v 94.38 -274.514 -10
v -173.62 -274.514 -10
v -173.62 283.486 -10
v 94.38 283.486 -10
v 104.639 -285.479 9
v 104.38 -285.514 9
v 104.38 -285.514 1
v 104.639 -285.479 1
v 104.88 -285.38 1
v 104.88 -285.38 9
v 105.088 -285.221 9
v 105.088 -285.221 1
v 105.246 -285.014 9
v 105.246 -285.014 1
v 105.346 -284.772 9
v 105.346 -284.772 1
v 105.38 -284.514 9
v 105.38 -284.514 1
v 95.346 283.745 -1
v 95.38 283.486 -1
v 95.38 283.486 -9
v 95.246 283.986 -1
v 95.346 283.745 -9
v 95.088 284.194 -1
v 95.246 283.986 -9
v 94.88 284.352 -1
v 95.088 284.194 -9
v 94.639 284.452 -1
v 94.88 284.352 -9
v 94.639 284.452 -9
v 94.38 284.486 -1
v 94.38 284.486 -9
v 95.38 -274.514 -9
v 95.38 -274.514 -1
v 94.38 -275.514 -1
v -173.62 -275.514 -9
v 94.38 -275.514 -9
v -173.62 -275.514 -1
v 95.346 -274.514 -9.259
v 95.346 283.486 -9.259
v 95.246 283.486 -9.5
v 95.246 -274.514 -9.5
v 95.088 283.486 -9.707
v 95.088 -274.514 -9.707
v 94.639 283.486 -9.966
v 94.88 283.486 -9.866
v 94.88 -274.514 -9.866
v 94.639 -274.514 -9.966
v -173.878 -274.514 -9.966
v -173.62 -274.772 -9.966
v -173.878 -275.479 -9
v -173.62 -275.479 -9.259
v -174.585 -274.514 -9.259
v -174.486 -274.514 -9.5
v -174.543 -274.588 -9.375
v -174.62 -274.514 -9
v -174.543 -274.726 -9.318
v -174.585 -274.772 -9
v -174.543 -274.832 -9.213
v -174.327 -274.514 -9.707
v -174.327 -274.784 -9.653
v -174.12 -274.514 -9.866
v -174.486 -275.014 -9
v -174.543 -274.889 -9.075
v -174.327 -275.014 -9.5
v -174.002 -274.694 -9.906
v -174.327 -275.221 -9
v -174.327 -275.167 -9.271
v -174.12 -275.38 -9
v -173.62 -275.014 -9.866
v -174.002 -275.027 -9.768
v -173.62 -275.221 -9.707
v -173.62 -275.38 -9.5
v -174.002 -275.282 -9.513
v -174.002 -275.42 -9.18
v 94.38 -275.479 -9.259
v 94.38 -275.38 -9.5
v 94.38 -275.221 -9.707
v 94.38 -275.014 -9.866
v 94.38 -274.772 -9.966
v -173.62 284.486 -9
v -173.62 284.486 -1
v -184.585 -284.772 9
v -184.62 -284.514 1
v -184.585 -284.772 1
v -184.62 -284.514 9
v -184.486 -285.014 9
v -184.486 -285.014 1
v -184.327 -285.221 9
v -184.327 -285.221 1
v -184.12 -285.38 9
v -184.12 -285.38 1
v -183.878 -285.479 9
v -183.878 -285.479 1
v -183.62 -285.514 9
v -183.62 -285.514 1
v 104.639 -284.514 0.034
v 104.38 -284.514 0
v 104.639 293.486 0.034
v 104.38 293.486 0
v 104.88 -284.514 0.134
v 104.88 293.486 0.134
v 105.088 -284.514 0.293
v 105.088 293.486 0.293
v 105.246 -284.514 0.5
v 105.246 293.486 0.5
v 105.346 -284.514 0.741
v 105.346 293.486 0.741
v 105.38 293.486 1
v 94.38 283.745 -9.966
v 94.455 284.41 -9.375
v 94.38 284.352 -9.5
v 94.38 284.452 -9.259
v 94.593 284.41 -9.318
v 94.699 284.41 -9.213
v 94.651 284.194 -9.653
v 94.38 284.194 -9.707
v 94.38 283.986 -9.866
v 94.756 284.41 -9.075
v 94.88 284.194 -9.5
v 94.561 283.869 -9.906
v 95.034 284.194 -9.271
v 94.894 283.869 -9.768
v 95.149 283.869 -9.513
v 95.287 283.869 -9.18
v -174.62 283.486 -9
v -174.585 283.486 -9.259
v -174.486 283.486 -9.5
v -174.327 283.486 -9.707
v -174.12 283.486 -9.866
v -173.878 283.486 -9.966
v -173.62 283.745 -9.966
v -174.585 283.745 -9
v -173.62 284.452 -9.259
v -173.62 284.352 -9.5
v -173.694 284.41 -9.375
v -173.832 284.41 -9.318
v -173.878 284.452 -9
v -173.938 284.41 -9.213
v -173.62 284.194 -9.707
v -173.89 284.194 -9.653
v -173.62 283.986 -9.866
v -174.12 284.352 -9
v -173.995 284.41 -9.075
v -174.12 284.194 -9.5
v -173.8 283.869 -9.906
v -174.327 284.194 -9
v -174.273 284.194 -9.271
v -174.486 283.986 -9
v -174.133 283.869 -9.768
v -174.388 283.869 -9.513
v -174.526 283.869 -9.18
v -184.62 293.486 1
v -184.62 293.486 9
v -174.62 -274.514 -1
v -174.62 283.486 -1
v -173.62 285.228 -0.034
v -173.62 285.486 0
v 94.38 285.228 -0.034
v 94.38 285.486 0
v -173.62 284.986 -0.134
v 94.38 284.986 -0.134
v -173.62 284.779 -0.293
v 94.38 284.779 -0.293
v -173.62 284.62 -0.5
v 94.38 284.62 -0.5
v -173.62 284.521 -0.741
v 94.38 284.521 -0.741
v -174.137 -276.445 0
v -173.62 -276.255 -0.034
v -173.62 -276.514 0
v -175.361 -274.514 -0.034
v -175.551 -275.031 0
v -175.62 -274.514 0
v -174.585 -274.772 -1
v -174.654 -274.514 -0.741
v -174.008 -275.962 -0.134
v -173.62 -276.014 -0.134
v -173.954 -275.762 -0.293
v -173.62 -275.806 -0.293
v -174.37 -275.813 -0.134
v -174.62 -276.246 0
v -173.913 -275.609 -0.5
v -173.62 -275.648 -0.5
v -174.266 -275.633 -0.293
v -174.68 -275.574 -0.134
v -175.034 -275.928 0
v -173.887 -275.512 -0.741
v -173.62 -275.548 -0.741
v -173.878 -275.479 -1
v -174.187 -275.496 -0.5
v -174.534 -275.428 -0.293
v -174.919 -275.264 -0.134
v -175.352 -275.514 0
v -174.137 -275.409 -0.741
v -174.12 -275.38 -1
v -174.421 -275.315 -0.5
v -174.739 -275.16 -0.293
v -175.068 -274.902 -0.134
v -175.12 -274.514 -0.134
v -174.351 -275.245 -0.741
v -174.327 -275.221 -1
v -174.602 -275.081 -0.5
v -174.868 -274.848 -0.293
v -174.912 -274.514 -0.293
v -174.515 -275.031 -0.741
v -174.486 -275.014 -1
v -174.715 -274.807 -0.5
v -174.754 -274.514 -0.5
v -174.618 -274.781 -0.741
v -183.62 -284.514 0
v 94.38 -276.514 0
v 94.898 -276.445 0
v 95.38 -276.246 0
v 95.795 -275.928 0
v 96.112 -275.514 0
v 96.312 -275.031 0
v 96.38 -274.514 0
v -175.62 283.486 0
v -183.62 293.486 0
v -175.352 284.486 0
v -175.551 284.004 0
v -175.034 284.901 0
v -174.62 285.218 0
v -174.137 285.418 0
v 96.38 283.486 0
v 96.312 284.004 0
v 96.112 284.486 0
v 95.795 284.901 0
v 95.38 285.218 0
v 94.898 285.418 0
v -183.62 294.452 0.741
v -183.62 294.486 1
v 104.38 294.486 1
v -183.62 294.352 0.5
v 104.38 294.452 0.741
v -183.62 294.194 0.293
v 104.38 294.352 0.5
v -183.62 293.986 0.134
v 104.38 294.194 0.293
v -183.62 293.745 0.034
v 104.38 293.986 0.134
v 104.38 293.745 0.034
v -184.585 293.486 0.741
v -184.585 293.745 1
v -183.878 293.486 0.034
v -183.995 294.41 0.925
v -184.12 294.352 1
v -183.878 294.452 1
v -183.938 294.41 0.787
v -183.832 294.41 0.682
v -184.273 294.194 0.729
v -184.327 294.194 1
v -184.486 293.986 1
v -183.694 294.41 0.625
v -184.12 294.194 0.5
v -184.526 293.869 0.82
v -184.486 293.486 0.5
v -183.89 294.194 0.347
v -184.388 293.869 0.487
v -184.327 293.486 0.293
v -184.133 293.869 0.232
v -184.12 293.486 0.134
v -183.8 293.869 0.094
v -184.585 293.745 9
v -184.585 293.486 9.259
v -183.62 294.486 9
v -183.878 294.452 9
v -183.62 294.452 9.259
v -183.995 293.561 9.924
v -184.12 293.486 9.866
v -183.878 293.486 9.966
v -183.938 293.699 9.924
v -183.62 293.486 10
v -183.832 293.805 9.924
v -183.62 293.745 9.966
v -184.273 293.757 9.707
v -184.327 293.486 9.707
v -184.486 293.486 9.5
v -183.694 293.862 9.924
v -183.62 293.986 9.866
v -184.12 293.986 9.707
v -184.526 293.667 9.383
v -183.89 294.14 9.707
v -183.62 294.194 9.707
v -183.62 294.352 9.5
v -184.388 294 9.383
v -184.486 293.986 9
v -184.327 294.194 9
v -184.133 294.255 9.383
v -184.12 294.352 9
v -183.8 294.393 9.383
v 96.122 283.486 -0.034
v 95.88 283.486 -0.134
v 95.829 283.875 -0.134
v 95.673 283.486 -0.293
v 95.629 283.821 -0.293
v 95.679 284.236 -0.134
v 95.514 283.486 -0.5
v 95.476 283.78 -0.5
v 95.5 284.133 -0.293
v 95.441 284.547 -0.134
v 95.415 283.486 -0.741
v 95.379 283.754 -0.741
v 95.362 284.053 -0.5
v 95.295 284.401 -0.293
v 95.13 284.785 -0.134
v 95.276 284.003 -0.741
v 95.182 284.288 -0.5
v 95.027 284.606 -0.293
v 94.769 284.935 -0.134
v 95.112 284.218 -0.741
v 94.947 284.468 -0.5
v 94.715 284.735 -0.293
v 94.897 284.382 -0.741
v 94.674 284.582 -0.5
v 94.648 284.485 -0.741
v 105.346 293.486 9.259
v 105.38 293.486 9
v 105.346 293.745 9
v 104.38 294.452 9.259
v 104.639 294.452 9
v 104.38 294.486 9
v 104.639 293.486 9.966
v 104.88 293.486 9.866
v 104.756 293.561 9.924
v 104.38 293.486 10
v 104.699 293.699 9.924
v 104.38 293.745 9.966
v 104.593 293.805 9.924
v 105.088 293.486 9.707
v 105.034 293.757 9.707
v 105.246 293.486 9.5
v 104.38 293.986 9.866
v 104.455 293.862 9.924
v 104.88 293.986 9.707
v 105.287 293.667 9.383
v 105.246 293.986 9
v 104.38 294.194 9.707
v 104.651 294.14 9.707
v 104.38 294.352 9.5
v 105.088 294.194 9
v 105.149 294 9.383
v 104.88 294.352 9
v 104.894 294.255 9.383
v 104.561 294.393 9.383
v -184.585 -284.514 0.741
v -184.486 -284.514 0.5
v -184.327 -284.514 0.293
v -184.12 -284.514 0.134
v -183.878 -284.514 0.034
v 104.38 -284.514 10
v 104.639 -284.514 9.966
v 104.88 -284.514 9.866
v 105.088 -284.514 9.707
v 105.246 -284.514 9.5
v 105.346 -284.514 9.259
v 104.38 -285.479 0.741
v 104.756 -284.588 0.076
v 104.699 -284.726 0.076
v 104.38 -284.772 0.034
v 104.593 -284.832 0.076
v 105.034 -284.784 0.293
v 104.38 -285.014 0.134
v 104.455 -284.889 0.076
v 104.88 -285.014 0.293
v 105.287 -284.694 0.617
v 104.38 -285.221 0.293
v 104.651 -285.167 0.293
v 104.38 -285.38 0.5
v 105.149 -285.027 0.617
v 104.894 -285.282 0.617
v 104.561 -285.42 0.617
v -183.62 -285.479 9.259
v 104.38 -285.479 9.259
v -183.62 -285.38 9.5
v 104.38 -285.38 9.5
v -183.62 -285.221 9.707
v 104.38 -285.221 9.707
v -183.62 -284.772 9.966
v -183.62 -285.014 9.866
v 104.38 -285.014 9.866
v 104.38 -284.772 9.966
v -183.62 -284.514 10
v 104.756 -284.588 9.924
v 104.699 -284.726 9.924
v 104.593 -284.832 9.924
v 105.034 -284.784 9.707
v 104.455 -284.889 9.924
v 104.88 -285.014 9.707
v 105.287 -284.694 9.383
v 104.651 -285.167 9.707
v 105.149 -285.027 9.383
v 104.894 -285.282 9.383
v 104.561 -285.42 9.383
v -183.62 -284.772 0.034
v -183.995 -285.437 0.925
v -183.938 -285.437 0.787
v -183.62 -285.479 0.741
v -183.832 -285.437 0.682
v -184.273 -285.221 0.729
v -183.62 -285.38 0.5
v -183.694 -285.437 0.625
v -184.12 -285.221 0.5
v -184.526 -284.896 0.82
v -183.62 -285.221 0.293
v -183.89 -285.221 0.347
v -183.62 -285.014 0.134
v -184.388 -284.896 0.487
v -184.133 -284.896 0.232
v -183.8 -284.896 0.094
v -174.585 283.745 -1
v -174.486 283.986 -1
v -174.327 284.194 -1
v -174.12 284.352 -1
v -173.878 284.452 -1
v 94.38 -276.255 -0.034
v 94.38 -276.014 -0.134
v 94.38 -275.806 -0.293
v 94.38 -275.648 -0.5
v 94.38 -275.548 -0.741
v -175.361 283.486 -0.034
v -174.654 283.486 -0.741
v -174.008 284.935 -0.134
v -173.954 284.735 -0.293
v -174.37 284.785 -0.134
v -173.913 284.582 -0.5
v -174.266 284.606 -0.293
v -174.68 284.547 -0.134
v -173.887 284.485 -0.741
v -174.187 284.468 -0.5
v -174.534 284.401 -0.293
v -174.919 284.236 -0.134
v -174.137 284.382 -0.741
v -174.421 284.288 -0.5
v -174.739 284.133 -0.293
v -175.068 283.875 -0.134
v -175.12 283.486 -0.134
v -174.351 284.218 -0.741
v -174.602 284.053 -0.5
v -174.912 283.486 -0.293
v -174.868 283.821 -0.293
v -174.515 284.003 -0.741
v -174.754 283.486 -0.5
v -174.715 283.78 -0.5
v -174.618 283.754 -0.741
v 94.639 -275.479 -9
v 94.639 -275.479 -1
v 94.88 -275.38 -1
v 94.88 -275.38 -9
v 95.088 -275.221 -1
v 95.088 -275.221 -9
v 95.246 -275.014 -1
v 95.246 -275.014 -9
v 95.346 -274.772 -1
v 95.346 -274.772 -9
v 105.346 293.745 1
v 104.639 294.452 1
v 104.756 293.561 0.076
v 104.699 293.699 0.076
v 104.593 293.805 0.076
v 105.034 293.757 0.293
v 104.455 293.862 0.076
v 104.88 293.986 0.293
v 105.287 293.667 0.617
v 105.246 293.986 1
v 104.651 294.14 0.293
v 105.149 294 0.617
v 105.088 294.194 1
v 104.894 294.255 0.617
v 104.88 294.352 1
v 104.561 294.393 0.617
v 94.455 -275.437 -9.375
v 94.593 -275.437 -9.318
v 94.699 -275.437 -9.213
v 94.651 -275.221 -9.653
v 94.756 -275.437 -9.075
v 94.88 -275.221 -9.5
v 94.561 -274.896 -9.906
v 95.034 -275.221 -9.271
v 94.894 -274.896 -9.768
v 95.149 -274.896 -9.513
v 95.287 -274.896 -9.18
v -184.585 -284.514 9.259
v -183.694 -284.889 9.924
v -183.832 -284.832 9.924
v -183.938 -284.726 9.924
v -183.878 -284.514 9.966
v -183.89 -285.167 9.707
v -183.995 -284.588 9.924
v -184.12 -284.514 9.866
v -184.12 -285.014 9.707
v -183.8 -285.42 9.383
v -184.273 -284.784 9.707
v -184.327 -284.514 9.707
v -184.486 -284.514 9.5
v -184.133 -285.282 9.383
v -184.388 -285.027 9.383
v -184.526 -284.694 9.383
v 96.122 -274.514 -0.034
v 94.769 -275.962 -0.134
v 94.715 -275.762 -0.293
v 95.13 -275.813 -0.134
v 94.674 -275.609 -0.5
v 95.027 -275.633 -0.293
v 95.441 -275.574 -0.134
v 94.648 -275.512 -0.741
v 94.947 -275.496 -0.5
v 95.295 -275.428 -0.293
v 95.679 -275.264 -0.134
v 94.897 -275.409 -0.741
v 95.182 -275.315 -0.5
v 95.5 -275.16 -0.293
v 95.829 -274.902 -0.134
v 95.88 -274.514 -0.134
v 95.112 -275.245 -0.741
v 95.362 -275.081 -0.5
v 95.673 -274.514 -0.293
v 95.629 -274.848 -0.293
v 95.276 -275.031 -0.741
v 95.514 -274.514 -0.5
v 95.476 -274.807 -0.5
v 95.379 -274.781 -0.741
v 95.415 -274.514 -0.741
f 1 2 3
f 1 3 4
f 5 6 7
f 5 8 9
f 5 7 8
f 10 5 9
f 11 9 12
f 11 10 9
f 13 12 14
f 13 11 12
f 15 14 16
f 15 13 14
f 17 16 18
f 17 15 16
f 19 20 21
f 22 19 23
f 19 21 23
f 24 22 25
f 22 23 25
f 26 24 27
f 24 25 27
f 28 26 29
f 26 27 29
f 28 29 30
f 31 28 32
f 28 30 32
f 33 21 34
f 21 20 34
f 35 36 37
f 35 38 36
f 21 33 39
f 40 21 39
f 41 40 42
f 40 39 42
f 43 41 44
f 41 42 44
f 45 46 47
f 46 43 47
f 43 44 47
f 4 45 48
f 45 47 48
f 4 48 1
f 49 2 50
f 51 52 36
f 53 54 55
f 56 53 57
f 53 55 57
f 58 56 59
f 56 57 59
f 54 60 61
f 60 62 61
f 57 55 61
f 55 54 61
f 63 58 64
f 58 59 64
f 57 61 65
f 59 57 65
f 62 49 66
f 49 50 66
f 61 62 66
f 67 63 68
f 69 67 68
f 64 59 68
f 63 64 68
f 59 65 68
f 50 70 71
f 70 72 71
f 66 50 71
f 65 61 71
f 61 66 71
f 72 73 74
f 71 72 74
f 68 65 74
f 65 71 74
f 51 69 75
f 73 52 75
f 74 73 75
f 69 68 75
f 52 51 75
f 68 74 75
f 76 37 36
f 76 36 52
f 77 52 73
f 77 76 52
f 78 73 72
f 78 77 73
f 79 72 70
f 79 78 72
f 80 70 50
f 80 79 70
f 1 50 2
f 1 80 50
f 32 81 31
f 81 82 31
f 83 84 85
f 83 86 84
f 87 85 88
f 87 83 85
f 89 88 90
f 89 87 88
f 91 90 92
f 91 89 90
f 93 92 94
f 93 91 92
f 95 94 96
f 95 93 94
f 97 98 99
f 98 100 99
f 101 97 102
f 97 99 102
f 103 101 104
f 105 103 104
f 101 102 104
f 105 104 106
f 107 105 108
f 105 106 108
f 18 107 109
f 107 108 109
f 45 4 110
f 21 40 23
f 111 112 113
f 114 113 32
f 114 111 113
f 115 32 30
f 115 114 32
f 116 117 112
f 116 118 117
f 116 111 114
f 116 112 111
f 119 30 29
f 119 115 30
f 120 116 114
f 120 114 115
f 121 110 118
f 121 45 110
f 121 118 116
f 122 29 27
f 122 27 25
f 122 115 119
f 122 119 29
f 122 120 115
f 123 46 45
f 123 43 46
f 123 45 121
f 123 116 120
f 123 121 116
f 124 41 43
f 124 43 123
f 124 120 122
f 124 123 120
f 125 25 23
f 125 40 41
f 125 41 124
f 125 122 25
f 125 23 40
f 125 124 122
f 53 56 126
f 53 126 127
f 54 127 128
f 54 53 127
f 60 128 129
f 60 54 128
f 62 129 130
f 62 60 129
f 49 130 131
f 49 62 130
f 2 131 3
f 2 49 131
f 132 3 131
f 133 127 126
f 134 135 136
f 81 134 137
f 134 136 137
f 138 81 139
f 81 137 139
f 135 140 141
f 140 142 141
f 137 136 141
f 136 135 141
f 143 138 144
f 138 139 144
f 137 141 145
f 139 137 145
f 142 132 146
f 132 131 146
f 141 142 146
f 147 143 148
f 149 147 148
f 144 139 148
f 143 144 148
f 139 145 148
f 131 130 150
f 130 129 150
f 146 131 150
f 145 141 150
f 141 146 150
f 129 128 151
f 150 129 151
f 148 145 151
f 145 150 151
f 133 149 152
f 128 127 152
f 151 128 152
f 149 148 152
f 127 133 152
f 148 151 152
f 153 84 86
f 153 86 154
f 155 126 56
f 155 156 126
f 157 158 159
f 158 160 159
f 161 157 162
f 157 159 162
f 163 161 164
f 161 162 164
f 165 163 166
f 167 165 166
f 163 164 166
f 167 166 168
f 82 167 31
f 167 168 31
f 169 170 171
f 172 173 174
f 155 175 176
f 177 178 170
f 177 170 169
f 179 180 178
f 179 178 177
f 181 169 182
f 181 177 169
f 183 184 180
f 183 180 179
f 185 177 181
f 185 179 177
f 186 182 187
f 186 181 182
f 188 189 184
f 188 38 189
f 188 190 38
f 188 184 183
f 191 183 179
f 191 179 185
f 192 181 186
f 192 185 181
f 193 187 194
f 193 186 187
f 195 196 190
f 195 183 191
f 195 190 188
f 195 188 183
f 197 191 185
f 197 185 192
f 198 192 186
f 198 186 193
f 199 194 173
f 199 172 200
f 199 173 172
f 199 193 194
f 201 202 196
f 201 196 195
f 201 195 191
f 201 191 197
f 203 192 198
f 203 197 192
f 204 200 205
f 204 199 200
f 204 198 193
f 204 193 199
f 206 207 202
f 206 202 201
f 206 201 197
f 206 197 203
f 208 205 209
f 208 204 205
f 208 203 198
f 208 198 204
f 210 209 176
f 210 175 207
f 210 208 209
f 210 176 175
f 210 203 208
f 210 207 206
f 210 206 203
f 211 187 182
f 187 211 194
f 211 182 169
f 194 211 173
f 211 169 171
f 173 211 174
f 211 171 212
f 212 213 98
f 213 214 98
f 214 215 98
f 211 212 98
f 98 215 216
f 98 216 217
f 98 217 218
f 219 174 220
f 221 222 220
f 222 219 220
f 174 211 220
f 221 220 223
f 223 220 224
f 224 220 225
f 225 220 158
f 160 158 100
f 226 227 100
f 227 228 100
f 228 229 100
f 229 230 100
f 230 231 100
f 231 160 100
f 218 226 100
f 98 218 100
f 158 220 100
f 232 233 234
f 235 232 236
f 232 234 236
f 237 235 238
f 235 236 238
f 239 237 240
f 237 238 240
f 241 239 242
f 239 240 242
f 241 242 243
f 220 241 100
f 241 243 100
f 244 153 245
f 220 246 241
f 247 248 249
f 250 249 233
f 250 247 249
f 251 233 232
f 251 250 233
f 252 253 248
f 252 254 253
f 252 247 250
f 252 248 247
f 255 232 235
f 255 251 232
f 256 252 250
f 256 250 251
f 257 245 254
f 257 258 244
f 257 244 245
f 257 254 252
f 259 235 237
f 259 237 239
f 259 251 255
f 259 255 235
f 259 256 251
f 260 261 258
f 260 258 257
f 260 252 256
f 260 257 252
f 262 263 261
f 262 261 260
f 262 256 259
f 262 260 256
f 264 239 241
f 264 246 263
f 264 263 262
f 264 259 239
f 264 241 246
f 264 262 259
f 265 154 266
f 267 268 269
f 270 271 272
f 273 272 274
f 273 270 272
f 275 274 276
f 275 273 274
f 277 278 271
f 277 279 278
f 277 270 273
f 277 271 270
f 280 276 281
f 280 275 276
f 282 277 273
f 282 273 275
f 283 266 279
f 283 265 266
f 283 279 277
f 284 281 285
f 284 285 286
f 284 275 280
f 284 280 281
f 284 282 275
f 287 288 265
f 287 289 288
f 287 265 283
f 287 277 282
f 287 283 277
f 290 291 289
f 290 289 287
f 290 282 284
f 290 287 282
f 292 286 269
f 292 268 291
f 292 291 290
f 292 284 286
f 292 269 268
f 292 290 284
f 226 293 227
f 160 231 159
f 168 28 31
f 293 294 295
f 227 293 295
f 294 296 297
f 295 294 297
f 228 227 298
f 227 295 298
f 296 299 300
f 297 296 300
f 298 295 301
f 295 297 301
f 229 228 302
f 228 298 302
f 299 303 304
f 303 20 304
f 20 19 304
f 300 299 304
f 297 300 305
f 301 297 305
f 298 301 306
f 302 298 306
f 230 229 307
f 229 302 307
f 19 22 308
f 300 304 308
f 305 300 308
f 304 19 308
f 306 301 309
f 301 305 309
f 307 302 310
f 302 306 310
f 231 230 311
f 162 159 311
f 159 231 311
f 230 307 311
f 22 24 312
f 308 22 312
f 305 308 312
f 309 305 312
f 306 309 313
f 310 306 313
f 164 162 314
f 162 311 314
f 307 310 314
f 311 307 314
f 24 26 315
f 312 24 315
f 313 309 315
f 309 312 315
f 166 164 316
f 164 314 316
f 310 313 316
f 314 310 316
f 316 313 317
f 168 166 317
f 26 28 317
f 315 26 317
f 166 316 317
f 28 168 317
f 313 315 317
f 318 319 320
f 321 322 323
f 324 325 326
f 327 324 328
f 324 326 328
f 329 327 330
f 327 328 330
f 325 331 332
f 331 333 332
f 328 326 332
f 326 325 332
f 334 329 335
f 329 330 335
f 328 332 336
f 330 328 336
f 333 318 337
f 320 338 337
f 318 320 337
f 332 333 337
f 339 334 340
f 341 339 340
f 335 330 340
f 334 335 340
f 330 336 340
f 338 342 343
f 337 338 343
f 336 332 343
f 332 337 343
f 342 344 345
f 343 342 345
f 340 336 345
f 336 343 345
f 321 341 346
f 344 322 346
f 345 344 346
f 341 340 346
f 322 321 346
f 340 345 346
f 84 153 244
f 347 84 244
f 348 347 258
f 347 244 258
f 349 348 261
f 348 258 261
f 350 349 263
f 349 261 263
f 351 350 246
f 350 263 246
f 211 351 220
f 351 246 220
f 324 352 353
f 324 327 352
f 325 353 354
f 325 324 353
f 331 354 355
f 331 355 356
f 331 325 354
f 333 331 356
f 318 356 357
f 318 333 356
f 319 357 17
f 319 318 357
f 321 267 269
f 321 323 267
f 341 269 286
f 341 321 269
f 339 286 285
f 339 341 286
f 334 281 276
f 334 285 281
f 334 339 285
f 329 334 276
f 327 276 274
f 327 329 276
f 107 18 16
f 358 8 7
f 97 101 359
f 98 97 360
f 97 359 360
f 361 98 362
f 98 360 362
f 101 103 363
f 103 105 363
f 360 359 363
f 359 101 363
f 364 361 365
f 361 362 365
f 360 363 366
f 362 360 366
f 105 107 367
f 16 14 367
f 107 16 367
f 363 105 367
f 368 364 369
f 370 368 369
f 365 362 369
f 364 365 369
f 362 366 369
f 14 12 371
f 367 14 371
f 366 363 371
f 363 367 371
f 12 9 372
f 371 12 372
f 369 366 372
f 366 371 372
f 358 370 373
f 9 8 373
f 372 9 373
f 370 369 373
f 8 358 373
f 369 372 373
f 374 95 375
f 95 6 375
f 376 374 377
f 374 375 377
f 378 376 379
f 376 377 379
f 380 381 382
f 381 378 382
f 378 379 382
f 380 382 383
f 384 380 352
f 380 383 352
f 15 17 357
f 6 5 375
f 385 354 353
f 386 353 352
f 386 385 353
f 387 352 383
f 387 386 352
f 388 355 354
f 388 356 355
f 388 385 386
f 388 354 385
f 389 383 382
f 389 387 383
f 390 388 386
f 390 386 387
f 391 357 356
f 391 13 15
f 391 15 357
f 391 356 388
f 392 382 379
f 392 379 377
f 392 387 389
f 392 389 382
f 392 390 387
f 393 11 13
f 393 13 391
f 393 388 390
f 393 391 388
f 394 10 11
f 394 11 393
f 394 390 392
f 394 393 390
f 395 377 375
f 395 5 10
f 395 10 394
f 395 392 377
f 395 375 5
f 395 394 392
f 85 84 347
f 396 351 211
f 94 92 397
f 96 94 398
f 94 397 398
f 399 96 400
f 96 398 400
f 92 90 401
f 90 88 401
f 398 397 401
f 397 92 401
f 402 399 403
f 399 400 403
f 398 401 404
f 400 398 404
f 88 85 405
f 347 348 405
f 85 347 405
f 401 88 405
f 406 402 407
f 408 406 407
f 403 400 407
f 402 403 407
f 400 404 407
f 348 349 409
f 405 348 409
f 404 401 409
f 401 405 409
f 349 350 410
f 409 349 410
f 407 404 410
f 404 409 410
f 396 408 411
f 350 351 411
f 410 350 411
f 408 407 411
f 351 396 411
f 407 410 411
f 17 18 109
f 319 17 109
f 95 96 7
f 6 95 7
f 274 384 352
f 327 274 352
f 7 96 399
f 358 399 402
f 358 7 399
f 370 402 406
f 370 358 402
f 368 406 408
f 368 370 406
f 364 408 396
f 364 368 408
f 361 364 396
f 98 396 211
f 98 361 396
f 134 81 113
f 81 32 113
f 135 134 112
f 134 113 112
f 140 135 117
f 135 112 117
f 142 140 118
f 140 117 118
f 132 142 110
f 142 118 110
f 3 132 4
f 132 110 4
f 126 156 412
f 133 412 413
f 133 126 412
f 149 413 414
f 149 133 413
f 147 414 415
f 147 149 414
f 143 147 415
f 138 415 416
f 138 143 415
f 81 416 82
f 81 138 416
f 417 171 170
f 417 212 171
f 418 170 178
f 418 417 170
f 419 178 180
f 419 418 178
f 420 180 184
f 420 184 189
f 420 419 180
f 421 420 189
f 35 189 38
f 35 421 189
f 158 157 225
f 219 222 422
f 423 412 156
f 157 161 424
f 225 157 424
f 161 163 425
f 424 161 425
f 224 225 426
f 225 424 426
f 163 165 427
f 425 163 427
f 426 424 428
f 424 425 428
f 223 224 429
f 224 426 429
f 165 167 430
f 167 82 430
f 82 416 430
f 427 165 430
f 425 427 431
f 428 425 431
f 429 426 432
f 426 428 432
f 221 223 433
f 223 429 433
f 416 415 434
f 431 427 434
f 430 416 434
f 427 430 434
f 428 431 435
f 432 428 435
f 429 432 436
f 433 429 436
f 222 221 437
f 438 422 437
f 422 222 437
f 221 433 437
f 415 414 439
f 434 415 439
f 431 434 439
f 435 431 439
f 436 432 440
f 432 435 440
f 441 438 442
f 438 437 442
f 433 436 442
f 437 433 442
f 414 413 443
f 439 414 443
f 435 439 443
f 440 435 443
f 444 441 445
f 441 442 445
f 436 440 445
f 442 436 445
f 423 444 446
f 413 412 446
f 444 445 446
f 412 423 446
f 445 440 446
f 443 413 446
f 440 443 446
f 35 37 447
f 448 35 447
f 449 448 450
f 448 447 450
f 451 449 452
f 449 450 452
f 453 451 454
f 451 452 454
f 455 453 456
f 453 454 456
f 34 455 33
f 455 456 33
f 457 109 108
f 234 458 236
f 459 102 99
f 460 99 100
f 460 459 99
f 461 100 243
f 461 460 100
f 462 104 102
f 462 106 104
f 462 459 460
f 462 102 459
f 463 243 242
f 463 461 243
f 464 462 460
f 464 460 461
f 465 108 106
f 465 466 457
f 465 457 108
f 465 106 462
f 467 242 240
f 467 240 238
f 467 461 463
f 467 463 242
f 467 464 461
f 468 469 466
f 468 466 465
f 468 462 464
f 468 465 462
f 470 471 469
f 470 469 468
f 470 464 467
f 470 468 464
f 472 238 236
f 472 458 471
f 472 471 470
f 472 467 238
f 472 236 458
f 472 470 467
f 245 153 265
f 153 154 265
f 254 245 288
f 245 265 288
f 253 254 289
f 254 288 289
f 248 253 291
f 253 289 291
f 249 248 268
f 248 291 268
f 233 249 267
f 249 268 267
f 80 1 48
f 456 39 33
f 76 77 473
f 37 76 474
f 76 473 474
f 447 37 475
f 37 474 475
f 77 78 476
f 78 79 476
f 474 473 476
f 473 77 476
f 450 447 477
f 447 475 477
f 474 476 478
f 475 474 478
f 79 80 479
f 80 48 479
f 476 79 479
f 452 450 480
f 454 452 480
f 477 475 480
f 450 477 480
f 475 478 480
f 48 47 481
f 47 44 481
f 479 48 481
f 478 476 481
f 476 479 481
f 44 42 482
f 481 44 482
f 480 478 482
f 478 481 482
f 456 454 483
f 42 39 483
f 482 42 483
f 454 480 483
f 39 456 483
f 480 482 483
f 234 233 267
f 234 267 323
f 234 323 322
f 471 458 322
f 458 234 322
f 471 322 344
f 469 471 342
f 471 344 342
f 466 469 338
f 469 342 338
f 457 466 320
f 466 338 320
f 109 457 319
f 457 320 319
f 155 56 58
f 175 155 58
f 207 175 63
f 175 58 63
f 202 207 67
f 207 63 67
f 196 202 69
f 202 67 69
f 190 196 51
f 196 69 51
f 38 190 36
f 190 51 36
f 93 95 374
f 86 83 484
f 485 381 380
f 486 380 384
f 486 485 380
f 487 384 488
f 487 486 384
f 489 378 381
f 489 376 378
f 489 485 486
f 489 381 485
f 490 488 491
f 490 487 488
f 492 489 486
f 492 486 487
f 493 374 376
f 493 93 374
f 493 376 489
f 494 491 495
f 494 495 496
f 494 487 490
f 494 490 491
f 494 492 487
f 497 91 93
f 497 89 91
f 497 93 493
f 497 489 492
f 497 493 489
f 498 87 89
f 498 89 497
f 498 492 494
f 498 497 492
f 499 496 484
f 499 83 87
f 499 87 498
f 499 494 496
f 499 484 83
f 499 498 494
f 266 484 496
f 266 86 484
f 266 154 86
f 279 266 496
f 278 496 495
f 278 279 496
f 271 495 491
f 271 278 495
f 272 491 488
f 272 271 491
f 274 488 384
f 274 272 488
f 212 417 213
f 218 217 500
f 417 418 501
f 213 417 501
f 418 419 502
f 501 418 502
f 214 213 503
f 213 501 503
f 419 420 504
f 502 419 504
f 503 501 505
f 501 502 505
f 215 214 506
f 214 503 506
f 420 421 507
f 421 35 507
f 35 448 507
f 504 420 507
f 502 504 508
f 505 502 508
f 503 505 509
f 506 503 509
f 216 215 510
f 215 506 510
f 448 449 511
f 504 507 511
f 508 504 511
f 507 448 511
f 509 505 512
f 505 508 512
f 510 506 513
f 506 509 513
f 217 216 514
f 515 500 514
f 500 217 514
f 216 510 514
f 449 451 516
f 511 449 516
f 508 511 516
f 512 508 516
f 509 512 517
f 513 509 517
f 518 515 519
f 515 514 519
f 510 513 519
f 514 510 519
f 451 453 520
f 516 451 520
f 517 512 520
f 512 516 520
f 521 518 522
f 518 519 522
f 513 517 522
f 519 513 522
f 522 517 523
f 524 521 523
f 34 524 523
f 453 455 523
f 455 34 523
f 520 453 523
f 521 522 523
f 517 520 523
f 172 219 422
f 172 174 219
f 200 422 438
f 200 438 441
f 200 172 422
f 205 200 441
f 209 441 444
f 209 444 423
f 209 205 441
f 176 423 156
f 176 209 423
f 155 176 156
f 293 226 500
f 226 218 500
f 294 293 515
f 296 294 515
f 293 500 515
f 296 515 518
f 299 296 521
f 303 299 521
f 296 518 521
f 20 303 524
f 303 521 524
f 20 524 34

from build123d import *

# Parameters (mm, degrees)
F0_W     = 290
F0_H     = 580
F1_DEPTH = 10
F2_W     = 270
F2_H     = 560
F3_DEPTH = 10
F4_R     = 1


with BuildPart() as f1:
    # F0 (on Top) → F1 (new body)
    with BuildSketch(Plane.XY):
        with Locations((-39.619565, 4.486432)):
            Rectangle(F0_W, F0_H)
    extrude(amount=F1_DEPTH)

    # F2 (on face) → F3 (join)
    with BuildSketch(Plane(origin=(0, 0, 0), x_dir=(1, 0, 0), z_dir=(0, 0, -1))):
        with Locations((-39.619565, -4.486432)):
            Rectangle(F2_W, F2_H)
    extrude(amount=F3_DEPTH)

    # F4
    f4_edges = [f1.edges().sort_by_distance(p)[0] for p in [
        (95.380435, 4.486432, -10),
        (-39.619565, -275.513568, -10),
        (-174.619565, 4.486432, -10),
        (-39.619565, 284.486432, -10),
        (-184.619565, 4.486432, 0),
        (95.380435, -275.513568, -5),
        (-174.619565, -275.513568, -5),
        (-39.619565, -275.513568, 0),
        (95.380435, 284.486432, -5),
        (95.380435, 4.486432, 0),
        (105.380435, -285.513568, 5),
        (105.380435, 294.486432, 5),
        (105.380435, 4.486432, 0),
        (105.380435, 4.486432, 10),
        (-184.619565, -285.513568, 5),
        (-39.619565, -285.513568, 0),
        (-39.619565, -285.513568, 10),
        (-184.619565, 294.486432, 5),
        (-184.619565, 4.486432, 10),
        (-39.619565, 294.486432, 0),
        (-39.619565, 294.486432, 10),
        (-174.619565, 284.486432, -5),
        (-39.619565, 284.486432, 0),
        (-174.619565, 4.486432, 0),
    ]]
    fillet(f4_edges, radius=F4_R)


solid = f1.part
